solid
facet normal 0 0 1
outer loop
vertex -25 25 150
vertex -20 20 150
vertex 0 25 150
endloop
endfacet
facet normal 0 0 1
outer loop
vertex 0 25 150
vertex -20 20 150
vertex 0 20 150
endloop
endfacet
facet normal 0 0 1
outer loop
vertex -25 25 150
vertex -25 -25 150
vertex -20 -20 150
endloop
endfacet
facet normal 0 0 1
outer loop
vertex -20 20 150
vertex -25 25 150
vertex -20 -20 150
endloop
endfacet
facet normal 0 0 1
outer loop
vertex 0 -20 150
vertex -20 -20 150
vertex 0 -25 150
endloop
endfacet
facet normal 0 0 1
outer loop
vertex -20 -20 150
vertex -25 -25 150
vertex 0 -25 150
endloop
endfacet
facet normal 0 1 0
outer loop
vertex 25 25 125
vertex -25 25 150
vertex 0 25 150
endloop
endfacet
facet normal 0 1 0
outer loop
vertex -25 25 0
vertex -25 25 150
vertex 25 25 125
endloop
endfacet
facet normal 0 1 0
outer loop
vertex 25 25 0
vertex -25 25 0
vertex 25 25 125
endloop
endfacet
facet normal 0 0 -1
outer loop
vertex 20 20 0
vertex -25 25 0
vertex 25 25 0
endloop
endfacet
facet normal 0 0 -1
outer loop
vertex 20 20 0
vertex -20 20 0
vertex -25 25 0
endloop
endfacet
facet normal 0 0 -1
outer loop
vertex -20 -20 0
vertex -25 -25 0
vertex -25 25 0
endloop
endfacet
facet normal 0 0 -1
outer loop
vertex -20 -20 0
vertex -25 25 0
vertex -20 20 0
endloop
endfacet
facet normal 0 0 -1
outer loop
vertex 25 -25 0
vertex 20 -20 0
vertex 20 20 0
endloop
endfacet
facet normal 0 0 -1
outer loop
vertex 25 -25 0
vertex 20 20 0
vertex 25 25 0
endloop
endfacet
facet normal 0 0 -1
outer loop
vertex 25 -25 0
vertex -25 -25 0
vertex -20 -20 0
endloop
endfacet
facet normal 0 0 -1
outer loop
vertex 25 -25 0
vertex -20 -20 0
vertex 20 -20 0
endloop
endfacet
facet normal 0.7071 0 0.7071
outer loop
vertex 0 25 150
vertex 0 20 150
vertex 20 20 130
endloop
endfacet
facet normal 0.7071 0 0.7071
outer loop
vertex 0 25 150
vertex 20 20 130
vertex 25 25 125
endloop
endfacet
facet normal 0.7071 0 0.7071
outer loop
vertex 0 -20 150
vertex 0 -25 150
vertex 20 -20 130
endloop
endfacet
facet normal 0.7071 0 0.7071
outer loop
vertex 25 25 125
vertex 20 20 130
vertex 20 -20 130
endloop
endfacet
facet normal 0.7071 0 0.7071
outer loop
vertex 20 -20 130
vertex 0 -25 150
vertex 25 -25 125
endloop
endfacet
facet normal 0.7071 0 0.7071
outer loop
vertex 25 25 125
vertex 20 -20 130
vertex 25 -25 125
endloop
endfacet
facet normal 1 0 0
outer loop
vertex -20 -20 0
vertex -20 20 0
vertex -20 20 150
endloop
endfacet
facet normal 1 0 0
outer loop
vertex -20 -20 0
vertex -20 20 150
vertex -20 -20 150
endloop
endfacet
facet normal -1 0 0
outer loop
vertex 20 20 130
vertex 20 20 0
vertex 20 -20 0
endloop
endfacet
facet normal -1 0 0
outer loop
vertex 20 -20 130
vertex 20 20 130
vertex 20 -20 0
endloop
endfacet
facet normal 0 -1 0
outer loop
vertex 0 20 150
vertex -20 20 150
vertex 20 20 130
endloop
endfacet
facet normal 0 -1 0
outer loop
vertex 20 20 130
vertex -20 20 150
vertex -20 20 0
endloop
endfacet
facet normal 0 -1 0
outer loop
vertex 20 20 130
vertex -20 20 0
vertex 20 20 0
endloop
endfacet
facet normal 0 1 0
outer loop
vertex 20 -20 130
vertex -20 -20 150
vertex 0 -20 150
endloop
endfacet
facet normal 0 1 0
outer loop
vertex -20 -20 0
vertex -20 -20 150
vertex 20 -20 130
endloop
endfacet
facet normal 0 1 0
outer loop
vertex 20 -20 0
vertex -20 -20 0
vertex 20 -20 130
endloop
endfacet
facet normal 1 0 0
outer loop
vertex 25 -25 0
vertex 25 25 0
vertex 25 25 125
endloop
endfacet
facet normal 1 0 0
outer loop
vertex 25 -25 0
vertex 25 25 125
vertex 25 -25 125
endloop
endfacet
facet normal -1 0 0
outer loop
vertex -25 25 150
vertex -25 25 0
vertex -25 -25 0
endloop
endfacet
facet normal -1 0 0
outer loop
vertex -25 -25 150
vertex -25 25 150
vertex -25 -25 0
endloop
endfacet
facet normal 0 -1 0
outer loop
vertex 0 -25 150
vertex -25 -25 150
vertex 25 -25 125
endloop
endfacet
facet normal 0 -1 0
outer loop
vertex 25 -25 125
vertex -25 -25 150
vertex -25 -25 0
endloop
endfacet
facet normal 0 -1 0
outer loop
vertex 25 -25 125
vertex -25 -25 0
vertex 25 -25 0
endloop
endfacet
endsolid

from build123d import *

# Parameters (mm, degrees)
SKETCH2_W           = 50
SKETCH2_H           = 50
SKETCH2_W_2         = 40
SKETCH2_H_2         = 40
BOSS_EXTRUDE1_DEPTH = 150
CUT_EXTRUDE1_DEPTH  = 161.078105936


with BuildPart() as part:
    # Sketch2 → Boss-Extrude1 (new body)
    with BuildSketch(Plane(origin=(0, 0, 0), x_dir=(1, 0, 0), z_dir=(0, 0, -1))):
        Rectangle(SKETCH2_W, SKETCH2_H)
        Rectangle(SKETCH2_W_2, SKETCH2_H_2, mode=Mode.SUBTRACT)
    extrude(amount=-BOSS_EXTRUDE1_DEPTH)

    # Sketch3 → Cut-Extrude1 (cut, through all)
    with BuildSketch(Plane.XZ.offset(25)):
        Polygon((0, 150), (25, 125), (25, 150), align=None)
    extrude(amount=-CUT_EXTRUDE1_DEPTH, mode=Mode.SUBTRACT)


solid = part.part
